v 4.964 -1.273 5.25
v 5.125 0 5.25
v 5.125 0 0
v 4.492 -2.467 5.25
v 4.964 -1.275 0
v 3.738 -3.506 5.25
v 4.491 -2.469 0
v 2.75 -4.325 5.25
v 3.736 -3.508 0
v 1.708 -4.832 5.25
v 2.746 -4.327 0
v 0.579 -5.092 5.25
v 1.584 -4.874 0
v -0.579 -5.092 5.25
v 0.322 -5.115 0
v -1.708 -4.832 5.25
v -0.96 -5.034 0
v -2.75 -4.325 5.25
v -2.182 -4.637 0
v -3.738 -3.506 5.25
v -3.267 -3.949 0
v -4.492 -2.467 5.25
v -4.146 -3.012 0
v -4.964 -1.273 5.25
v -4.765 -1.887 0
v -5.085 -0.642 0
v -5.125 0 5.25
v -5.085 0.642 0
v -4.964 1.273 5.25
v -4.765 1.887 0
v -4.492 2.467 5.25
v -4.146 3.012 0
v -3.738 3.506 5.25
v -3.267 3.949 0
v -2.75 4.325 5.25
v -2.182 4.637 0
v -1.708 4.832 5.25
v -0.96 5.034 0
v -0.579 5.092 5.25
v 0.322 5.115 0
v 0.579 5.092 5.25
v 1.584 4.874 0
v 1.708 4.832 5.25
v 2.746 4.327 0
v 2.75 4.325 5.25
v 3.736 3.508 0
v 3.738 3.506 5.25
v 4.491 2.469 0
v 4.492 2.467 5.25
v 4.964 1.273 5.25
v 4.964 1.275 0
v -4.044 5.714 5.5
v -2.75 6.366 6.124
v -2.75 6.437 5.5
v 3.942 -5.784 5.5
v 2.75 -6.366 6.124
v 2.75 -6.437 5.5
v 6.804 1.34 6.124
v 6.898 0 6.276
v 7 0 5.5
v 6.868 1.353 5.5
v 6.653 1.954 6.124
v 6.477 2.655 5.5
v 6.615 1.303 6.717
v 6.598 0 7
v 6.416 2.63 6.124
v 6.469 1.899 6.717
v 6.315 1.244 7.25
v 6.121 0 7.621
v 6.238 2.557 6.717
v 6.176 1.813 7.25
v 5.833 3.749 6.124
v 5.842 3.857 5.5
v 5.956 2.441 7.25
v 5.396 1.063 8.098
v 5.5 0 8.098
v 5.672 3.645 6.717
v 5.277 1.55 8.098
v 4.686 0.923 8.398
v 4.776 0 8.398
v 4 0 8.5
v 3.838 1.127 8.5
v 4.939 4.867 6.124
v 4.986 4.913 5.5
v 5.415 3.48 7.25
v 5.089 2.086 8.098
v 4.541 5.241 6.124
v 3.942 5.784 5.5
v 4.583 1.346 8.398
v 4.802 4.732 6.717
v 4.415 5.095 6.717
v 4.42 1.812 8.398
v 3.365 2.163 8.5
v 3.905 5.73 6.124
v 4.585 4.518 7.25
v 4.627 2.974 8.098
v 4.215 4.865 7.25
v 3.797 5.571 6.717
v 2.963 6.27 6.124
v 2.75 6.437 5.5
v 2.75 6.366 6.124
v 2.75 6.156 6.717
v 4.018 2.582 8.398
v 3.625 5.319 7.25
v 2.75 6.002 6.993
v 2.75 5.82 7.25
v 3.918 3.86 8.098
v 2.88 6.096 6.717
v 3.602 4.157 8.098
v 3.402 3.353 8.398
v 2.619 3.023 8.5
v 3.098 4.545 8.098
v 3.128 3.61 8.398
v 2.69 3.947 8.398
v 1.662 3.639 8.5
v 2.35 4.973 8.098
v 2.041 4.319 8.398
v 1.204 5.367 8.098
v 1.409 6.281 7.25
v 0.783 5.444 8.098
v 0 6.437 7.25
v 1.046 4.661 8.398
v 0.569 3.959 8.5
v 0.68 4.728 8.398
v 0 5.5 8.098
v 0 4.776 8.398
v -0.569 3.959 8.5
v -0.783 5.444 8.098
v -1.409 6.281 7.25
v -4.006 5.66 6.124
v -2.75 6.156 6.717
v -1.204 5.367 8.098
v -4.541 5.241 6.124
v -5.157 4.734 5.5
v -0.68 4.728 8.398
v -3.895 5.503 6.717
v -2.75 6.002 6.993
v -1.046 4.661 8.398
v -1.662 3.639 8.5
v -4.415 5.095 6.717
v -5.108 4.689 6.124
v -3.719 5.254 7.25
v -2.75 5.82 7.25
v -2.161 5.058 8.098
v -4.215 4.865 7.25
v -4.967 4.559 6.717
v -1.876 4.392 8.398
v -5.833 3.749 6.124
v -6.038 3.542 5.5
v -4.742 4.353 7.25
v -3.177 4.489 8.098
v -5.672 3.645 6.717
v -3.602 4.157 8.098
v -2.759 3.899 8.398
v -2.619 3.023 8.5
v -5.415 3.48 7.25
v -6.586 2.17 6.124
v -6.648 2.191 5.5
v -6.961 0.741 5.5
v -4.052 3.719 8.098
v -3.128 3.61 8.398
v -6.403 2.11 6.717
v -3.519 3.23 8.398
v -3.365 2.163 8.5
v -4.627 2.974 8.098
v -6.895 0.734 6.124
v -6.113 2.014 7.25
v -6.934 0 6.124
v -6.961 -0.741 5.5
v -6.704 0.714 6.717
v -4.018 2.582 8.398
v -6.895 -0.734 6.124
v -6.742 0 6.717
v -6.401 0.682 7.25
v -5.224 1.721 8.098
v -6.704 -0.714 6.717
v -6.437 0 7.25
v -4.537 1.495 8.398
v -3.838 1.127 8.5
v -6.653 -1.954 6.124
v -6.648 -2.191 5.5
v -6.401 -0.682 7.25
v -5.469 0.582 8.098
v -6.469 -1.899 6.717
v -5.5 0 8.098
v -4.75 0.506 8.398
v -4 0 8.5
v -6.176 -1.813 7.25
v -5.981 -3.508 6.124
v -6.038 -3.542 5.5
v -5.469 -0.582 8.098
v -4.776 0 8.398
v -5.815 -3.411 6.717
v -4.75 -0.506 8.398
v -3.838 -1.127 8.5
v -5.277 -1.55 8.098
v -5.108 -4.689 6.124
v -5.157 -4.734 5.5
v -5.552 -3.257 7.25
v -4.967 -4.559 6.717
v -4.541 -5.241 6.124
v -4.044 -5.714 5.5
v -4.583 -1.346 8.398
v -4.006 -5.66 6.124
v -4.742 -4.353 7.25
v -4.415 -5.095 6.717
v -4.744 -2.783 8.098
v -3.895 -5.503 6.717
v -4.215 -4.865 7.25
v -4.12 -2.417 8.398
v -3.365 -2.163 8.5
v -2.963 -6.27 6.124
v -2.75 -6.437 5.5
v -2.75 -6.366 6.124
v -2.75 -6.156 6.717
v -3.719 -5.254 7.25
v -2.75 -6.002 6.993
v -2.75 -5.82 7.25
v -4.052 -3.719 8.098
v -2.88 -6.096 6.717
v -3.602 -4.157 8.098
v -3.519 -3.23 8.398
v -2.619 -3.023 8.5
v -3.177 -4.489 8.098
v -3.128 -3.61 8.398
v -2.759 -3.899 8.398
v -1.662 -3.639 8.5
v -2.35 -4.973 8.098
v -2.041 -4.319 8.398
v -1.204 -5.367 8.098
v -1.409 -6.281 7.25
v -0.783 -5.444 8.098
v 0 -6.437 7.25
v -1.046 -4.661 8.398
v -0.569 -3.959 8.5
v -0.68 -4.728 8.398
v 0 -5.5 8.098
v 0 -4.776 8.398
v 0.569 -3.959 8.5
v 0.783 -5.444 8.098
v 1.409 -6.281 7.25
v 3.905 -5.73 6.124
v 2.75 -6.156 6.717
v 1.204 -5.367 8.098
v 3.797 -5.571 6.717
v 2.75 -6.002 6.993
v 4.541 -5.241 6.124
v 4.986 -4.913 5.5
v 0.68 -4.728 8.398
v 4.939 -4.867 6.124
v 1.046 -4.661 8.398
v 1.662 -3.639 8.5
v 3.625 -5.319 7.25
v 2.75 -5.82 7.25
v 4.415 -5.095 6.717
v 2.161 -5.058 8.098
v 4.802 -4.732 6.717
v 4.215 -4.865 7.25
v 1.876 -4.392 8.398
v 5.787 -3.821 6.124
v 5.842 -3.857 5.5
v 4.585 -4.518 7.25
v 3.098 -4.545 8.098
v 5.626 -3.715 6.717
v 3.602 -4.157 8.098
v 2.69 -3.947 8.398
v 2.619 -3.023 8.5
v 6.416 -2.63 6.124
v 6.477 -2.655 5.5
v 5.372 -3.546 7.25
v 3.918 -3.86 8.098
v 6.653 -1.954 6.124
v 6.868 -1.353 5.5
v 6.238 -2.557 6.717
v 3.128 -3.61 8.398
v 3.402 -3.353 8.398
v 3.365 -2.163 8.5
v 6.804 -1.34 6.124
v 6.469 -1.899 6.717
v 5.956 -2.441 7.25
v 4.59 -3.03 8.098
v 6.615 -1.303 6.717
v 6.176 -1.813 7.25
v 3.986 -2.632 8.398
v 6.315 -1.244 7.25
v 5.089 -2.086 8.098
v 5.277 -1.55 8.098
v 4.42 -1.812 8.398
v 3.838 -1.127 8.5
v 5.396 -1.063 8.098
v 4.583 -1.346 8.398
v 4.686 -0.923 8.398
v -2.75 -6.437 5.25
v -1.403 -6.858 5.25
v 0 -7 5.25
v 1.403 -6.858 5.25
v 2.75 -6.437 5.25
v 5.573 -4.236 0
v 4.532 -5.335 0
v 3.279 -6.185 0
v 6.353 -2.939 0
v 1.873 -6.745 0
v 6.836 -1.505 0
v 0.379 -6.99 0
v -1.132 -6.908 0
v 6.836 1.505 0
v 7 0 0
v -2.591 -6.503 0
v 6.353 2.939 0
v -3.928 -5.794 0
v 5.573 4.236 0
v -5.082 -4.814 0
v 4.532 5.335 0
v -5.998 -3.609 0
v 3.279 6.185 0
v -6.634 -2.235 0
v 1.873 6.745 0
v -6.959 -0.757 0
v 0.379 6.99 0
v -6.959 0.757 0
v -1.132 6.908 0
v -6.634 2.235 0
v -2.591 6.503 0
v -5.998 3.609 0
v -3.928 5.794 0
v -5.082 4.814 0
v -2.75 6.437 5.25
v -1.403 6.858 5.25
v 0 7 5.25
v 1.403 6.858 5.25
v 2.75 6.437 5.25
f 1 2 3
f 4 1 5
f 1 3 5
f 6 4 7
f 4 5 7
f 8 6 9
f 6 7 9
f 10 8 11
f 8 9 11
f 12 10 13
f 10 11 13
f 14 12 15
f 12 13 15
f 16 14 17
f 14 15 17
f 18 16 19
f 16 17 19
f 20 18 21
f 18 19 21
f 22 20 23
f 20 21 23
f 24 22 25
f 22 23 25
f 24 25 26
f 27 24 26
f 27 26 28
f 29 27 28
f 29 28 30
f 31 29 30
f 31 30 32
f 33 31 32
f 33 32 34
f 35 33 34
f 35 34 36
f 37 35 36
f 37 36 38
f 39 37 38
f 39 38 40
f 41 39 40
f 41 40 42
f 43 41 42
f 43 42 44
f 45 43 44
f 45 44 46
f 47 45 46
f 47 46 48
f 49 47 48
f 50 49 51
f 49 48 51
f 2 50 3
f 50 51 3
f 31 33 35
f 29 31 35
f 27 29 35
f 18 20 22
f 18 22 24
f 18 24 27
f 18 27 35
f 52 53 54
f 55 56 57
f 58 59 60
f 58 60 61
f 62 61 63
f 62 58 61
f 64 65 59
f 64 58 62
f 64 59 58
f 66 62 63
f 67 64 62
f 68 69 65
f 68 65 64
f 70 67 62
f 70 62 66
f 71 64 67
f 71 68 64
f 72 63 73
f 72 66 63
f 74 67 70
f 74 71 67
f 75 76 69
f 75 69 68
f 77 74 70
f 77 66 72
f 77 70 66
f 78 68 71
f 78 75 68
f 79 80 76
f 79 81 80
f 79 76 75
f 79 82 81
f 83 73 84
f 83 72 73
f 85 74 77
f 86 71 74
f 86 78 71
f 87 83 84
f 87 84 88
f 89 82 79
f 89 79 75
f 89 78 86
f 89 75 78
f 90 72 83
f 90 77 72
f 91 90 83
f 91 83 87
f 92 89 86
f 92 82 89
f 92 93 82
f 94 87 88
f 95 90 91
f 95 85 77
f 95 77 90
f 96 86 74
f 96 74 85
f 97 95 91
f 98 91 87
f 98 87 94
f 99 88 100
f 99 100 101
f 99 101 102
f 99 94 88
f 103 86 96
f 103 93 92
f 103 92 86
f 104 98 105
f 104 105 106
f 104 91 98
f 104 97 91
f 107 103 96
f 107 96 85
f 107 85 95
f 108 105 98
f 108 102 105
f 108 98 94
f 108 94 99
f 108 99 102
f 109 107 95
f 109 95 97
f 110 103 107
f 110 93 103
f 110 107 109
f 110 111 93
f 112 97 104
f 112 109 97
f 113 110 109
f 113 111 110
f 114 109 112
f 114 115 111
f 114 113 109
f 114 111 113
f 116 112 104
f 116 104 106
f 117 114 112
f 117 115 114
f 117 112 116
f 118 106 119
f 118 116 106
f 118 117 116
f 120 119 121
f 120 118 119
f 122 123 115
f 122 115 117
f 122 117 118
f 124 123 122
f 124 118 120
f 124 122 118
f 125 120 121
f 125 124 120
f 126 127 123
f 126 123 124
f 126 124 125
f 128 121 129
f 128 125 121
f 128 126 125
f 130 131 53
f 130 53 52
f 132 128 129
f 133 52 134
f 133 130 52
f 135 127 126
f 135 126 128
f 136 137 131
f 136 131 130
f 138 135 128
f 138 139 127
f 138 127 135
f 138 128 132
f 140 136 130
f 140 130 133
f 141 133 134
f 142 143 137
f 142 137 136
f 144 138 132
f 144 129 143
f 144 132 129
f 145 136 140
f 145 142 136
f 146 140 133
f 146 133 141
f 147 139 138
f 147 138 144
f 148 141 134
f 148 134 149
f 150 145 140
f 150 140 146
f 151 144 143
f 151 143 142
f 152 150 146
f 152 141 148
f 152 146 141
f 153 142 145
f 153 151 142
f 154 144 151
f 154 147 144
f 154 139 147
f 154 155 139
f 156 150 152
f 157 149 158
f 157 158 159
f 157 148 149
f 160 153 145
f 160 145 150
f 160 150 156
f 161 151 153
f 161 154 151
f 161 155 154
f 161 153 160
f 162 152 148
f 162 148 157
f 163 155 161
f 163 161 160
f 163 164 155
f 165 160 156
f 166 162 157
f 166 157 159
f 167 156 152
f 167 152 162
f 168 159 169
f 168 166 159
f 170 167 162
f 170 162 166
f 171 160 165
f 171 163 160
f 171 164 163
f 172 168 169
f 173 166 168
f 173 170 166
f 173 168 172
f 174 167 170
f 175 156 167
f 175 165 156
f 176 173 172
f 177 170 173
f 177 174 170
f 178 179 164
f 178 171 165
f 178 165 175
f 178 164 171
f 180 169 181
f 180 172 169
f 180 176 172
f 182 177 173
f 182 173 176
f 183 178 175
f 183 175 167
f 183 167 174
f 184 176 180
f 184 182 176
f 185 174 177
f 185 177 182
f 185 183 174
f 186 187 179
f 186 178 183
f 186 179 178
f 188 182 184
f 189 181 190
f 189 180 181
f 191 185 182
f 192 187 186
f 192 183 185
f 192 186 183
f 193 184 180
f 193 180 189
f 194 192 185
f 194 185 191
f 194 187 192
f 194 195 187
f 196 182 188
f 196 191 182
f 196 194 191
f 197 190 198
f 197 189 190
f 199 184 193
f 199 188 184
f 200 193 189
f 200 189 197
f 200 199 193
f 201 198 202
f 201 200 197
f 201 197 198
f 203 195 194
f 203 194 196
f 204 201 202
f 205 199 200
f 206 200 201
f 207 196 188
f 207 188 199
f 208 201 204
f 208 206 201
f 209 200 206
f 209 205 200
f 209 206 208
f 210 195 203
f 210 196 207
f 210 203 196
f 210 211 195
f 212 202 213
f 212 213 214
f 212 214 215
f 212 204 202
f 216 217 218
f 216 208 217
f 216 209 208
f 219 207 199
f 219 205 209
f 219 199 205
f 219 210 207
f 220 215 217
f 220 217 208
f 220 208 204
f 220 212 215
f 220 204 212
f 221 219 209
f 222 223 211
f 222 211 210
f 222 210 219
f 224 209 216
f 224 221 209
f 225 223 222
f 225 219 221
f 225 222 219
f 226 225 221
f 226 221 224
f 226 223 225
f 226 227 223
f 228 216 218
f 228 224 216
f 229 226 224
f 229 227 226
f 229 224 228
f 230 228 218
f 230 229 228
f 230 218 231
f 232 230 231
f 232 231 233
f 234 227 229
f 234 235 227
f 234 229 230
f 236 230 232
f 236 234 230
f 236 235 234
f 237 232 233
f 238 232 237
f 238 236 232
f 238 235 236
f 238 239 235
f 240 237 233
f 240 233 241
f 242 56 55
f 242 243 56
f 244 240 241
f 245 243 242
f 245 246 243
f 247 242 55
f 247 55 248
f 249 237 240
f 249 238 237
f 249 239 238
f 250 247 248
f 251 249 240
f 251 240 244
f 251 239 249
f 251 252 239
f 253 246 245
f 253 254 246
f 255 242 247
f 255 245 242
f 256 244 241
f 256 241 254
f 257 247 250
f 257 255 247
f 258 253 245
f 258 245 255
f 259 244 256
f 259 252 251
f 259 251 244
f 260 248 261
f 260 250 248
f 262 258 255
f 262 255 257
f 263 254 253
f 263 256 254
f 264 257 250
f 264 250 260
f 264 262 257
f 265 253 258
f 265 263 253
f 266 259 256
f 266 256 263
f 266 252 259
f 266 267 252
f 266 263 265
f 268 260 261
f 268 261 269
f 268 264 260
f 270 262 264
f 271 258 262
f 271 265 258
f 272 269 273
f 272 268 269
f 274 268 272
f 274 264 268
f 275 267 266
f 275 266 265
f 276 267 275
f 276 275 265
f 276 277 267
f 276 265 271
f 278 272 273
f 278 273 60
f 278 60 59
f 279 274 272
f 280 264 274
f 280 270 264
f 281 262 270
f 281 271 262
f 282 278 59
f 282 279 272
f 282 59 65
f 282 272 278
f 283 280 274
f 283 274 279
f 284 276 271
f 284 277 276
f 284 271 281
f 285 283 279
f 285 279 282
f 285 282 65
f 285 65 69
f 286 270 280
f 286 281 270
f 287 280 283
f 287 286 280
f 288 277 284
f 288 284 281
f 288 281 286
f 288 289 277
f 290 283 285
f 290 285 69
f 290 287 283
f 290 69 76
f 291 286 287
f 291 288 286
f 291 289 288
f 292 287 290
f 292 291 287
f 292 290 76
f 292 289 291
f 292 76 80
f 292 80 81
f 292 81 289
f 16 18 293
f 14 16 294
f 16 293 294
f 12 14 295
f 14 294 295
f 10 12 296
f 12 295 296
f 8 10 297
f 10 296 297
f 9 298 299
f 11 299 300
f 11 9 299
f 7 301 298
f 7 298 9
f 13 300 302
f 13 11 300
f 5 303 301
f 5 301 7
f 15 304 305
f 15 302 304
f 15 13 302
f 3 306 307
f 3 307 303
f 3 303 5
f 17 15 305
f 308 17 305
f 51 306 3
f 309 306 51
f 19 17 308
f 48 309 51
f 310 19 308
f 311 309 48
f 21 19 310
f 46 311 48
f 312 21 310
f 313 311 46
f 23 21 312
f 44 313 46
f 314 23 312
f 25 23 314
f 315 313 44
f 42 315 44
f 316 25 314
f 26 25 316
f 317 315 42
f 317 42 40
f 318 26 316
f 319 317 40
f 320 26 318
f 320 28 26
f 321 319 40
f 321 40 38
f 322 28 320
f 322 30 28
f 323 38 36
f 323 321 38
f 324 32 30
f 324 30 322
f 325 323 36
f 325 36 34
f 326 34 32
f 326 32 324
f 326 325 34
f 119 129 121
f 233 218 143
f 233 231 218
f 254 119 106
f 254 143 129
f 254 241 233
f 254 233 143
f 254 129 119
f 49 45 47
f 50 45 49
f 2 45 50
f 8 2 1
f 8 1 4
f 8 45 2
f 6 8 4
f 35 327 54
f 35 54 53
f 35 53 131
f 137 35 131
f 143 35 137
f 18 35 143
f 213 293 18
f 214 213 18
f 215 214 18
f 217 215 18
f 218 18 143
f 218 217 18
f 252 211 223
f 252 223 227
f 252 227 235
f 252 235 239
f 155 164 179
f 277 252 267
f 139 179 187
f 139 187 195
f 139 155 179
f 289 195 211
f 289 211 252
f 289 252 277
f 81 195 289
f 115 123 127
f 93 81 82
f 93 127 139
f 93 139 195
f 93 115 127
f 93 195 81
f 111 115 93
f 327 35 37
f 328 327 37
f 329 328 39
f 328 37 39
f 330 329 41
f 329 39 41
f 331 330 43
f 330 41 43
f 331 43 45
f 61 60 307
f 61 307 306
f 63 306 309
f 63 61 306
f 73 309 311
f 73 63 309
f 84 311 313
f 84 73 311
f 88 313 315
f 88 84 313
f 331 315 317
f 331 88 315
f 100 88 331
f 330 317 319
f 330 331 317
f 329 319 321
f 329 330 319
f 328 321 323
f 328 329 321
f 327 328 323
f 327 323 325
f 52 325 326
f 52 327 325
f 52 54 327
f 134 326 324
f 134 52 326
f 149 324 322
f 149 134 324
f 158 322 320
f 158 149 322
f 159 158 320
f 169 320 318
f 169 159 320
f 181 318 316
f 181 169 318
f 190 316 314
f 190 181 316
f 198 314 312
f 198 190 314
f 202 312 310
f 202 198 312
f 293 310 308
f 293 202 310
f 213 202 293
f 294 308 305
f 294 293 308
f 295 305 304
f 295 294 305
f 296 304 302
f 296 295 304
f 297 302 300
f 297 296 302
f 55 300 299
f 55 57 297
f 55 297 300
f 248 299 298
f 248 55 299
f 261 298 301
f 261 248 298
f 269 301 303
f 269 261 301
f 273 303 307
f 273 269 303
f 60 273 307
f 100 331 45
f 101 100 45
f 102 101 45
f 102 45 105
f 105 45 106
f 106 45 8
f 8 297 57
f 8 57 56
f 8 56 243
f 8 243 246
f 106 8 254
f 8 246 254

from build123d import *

# Parameters (mm, degrees)
F2_R     = 5.125
F3_DEPTH = 5.25
F4_W     = 5.5
F4_H     = 2
F5_DEPTH = 7.5


with BuildPart() as f1:
    # F0 (on Front) → F1 (revolve)
    with BuildSketch(Plane.XZ):
        with BuildLine():
            Line((0, 8.5), (0, 0))
            Line((0, 0), (7, 0))
            Line((7, 0), (7, 5.5))
            ThreePointArc((7, 5.5), (6.12132, 7.62132), (4, 8.5))
            Line((4, 8.5), (0, 8.5))
        make_face()
    revolve(axis=Axis((0, 0, 2.545049), (0, 0, 1)))

    # F2 (on face) → F3 (cut)
    with BuildSketch(Plane(origin=(0, 0, 0), x_dir=(1, 0, 0), z_dir=(0, 0, -1))):
        Circle(F2_R)
    extrude(amount=-F3_DEPTH, mode=Mode.SUBTRACT)

    # F4 (on Front) → F5 (cut, symmetric)
    with BuildSketch(Plane.XZ):
        with Locations((0, 6.25)):
            Rectangle(F4_W, F4_H)
    extrude(amount=F5_DEPTH, both=True, mode=Mode.SUBTRACT)


solid = f1.part
